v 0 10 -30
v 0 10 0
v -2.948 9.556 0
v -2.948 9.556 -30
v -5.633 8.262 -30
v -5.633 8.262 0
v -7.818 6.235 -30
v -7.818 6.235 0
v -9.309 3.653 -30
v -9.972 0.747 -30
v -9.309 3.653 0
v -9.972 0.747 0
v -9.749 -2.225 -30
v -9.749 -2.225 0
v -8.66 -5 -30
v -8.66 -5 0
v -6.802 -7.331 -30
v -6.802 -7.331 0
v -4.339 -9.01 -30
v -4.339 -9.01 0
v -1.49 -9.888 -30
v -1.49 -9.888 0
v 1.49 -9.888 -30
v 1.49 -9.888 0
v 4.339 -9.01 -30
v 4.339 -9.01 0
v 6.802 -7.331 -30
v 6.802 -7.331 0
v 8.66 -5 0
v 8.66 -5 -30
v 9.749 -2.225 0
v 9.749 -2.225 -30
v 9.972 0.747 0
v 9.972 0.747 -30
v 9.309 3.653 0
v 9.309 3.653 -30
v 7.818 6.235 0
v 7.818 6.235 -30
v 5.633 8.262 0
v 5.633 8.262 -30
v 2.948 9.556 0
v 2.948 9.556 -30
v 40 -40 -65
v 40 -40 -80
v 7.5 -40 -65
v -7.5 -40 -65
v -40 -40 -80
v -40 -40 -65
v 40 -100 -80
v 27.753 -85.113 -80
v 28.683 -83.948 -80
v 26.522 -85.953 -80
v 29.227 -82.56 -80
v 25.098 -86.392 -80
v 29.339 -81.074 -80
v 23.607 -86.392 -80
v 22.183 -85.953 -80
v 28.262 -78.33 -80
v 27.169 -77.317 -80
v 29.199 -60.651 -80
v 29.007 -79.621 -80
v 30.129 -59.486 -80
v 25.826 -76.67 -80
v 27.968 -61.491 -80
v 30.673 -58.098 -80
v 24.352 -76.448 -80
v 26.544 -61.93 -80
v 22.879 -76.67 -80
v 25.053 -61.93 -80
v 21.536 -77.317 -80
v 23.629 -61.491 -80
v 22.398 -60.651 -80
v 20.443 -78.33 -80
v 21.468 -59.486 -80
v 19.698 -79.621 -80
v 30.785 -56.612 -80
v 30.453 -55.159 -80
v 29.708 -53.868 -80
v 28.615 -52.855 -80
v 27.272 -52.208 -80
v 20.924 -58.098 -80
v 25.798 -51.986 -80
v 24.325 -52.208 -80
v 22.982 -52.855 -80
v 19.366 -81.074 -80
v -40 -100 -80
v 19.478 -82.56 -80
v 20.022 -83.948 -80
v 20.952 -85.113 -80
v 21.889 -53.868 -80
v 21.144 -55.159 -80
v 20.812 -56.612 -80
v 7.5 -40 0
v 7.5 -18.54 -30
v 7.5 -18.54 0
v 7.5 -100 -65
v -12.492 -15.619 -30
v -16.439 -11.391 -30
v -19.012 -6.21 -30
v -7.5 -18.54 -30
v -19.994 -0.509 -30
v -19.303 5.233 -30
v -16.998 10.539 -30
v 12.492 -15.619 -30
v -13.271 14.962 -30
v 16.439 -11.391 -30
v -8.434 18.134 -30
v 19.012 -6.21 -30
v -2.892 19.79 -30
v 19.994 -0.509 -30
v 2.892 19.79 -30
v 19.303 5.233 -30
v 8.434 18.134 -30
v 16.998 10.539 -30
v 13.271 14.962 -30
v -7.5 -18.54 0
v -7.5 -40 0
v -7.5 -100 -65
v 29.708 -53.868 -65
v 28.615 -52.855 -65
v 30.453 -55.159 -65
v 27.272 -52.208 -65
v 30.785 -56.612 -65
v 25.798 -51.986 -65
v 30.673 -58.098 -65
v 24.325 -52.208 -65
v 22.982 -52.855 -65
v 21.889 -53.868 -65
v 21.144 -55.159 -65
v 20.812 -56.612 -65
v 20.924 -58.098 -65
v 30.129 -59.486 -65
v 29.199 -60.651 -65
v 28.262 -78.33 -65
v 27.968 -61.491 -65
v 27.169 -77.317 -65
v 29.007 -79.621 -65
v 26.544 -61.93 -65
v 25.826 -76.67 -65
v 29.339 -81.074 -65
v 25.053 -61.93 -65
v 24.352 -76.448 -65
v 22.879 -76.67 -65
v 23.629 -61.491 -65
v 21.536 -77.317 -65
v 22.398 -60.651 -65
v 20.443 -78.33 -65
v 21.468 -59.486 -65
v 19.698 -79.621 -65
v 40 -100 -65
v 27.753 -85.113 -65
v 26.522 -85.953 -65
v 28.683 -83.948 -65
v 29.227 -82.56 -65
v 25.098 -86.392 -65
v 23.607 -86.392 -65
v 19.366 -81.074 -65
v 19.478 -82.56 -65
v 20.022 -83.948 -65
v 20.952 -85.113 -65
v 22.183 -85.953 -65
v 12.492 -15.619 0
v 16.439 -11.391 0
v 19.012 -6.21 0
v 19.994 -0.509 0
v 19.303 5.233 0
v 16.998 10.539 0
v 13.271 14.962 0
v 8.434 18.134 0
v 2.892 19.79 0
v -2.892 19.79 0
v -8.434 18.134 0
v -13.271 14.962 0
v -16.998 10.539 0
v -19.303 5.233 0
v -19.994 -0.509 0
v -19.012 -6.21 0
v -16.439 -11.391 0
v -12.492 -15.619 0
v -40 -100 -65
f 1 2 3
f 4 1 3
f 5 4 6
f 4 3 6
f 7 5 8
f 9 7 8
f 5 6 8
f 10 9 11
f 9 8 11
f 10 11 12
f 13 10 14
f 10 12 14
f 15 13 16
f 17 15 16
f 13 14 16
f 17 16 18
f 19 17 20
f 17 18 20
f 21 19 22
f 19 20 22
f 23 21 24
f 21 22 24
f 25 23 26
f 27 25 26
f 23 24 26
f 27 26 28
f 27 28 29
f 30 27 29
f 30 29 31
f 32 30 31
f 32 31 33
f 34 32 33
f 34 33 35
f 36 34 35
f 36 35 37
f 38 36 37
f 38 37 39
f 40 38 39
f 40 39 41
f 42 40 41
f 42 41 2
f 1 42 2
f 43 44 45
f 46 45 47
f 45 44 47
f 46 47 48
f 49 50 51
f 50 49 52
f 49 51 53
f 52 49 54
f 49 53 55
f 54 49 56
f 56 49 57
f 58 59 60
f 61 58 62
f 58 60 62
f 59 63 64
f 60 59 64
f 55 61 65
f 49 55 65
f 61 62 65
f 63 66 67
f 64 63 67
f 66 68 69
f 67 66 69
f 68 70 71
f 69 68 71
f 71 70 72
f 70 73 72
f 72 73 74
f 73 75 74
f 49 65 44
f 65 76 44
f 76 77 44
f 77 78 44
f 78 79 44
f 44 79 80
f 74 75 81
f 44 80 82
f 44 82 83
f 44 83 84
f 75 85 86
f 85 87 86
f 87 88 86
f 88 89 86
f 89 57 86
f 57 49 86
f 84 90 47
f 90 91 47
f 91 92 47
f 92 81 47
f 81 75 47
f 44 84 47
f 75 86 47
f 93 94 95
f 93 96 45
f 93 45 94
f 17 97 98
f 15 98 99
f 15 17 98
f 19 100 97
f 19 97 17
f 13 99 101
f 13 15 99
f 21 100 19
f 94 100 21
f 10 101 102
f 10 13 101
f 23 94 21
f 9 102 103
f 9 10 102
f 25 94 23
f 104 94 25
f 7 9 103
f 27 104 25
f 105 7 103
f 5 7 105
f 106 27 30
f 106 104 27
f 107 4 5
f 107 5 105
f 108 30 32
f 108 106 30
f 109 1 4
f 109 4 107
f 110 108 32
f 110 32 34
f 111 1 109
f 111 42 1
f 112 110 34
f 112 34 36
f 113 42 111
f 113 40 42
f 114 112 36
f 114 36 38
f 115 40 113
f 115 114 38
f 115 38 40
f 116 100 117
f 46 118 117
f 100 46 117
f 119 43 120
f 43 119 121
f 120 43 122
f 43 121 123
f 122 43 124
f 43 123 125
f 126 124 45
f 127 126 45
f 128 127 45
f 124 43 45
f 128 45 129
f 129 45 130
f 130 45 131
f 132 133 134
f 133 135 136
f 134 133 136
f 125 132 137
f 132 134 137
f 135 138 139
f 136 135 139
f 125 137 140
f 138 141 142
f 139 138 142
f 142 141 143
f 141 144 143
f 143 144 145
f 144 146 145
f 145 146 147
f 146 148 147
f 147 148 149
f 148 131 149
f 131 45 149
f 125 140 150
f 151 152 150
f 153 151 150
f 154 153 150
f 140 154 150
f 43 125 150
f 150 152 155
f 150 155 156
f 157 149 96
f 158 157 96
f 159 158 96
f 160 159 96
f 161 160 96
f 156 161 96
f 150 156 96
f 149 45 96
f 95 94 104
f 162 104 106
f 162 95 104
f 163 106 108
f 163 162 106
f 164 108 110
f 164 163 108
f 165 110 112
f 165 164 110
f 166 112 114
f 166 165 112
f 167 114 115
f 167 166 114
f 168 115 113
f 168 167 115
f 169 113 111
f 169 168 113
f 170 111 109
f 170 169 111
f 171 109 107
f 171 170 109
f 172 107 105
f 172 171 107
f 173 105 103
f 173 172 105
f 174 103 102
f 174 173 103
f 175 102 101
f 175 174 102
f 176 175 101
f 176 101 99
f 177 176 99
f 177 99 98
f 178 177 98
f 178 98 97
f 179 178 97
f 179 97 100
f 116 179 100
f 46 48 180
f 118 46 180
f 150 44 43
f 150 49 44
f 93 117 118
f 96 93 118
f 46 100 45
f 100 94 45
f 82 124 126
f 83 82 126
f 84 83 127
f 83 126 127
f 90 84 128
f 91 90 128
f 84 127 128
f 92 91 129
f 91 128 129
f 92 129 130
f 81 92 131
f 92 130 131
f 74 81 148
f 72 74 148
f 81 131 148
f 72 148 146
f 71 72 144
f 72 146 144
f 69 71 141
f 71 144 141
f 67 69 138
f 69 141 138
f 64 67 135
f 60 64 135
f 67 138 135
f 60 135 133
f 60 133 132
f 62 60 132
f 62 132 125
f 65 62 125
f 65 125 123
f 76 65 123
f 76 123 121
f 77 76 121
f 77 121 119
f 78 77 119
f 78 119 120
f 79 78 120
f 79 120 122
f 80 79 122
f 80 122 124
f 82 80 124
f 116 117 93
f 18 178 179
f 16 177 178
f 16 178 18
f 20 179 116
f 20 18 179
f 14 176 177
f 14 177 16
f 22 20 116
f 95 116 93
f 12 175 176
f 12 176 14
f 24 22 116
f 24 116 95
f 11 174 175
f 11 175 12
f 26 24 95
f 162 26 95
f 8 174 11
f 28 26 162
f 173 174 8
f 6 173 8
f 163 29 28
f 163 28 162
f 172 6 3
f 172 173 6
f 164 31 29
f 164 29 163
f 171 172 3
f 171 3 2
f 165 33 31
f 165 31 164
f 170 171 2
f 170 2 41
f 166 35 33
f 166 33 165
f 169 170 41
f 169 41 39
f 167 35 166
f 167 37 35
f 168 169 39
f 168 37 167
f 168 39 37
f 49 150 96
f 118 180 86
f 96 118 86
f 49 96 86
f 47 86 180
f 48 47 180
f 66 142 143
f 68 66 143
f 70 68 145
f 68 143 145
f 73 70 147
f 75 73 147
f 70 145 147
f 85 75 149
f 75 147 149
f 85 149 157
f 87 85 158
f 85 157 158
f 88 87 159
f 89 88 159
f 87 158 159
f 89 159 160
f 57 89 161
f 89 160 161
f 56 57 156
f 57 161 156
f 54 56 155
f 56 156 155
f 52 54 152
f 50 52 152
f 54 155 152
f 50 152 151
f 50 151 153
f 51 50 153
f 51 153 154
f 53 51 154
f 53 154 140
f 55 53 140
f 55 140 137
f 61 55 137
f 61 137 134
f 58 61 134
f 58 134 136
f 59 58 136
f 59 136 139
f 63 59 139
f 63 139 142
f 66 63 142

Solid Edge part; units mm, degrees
sketch "Sketch1" plane through (0, 0, 0) normal (0, 0, 1) x (1, 0, 0)
  circle A0 centre (0, 0) radius 20
extrude "Protrusion1" add sketch "Sketch1" against normal blind 35
sketch "Sketch2" plane through (0, 0, 0) normal (1, 0, 0) x (0, 1, 0)
  line L0 (-40, 0) -> (-100, -65)
  line L1 (-100, -65) -> (0, -65)
  line L2 (0, -65) -> (0, 0)
  line L3 (0, 0) -> (-40, 0)
extrude "拉延_2" add sketch "Sketch2" along normal mid plane 15
sketch "Sketch3" plane through (0, 0, 0) normal (1, 0, 0) x (0, 1, 0)
  line L0 (-40, -80) -> (-40, -65)
  line L1 (-40, -65) -> (-100, -65)
  line L2 (-100, -65) -> (-100, -80)
  line L3 (-100, -80) -> (-40, -80)
extrude "拉延_3" add sketch "Sketch3" along normal mid plane 80
sketch "Sketch4" plane through (40, 0, 0) normal (1, 0, 0) x (0, 1, 0)
  line L0 (-18.5405, -30) -> (29.7908, -30)
  line L1 (29.7908, -65) -> (29.7908, -30)
  line L2 (-40, -65) -> (29.7908, -65)
  line L3 (-18.5405, -30) -> (-40, -65)
extrude "Cutout1" cut sketch "Sketch4" against normal up to next
sketch "Sketch5" plane through (0, -10, 0) normal (0, 0, 1) x (0, 1, 0)
  circle A0 centre (10, 0) radius 10
extrude "Cutout2" cut sketch "Sketch5" against normal up to next
sketch "Sketch6" plane through (23.75, -70, -65) normal (0, 0, 1) x (0, 1, 0)
  circle A0 centre (13.0142, -2.0485) radius 5
  circle A1 centre (-11.4477, -0.6025) radius 5
  dimension "D1" = 10
extrude "Cutout3" cut sketch "Sketch6" against normal up to next
properties material "ABS Plastic, high impact"
